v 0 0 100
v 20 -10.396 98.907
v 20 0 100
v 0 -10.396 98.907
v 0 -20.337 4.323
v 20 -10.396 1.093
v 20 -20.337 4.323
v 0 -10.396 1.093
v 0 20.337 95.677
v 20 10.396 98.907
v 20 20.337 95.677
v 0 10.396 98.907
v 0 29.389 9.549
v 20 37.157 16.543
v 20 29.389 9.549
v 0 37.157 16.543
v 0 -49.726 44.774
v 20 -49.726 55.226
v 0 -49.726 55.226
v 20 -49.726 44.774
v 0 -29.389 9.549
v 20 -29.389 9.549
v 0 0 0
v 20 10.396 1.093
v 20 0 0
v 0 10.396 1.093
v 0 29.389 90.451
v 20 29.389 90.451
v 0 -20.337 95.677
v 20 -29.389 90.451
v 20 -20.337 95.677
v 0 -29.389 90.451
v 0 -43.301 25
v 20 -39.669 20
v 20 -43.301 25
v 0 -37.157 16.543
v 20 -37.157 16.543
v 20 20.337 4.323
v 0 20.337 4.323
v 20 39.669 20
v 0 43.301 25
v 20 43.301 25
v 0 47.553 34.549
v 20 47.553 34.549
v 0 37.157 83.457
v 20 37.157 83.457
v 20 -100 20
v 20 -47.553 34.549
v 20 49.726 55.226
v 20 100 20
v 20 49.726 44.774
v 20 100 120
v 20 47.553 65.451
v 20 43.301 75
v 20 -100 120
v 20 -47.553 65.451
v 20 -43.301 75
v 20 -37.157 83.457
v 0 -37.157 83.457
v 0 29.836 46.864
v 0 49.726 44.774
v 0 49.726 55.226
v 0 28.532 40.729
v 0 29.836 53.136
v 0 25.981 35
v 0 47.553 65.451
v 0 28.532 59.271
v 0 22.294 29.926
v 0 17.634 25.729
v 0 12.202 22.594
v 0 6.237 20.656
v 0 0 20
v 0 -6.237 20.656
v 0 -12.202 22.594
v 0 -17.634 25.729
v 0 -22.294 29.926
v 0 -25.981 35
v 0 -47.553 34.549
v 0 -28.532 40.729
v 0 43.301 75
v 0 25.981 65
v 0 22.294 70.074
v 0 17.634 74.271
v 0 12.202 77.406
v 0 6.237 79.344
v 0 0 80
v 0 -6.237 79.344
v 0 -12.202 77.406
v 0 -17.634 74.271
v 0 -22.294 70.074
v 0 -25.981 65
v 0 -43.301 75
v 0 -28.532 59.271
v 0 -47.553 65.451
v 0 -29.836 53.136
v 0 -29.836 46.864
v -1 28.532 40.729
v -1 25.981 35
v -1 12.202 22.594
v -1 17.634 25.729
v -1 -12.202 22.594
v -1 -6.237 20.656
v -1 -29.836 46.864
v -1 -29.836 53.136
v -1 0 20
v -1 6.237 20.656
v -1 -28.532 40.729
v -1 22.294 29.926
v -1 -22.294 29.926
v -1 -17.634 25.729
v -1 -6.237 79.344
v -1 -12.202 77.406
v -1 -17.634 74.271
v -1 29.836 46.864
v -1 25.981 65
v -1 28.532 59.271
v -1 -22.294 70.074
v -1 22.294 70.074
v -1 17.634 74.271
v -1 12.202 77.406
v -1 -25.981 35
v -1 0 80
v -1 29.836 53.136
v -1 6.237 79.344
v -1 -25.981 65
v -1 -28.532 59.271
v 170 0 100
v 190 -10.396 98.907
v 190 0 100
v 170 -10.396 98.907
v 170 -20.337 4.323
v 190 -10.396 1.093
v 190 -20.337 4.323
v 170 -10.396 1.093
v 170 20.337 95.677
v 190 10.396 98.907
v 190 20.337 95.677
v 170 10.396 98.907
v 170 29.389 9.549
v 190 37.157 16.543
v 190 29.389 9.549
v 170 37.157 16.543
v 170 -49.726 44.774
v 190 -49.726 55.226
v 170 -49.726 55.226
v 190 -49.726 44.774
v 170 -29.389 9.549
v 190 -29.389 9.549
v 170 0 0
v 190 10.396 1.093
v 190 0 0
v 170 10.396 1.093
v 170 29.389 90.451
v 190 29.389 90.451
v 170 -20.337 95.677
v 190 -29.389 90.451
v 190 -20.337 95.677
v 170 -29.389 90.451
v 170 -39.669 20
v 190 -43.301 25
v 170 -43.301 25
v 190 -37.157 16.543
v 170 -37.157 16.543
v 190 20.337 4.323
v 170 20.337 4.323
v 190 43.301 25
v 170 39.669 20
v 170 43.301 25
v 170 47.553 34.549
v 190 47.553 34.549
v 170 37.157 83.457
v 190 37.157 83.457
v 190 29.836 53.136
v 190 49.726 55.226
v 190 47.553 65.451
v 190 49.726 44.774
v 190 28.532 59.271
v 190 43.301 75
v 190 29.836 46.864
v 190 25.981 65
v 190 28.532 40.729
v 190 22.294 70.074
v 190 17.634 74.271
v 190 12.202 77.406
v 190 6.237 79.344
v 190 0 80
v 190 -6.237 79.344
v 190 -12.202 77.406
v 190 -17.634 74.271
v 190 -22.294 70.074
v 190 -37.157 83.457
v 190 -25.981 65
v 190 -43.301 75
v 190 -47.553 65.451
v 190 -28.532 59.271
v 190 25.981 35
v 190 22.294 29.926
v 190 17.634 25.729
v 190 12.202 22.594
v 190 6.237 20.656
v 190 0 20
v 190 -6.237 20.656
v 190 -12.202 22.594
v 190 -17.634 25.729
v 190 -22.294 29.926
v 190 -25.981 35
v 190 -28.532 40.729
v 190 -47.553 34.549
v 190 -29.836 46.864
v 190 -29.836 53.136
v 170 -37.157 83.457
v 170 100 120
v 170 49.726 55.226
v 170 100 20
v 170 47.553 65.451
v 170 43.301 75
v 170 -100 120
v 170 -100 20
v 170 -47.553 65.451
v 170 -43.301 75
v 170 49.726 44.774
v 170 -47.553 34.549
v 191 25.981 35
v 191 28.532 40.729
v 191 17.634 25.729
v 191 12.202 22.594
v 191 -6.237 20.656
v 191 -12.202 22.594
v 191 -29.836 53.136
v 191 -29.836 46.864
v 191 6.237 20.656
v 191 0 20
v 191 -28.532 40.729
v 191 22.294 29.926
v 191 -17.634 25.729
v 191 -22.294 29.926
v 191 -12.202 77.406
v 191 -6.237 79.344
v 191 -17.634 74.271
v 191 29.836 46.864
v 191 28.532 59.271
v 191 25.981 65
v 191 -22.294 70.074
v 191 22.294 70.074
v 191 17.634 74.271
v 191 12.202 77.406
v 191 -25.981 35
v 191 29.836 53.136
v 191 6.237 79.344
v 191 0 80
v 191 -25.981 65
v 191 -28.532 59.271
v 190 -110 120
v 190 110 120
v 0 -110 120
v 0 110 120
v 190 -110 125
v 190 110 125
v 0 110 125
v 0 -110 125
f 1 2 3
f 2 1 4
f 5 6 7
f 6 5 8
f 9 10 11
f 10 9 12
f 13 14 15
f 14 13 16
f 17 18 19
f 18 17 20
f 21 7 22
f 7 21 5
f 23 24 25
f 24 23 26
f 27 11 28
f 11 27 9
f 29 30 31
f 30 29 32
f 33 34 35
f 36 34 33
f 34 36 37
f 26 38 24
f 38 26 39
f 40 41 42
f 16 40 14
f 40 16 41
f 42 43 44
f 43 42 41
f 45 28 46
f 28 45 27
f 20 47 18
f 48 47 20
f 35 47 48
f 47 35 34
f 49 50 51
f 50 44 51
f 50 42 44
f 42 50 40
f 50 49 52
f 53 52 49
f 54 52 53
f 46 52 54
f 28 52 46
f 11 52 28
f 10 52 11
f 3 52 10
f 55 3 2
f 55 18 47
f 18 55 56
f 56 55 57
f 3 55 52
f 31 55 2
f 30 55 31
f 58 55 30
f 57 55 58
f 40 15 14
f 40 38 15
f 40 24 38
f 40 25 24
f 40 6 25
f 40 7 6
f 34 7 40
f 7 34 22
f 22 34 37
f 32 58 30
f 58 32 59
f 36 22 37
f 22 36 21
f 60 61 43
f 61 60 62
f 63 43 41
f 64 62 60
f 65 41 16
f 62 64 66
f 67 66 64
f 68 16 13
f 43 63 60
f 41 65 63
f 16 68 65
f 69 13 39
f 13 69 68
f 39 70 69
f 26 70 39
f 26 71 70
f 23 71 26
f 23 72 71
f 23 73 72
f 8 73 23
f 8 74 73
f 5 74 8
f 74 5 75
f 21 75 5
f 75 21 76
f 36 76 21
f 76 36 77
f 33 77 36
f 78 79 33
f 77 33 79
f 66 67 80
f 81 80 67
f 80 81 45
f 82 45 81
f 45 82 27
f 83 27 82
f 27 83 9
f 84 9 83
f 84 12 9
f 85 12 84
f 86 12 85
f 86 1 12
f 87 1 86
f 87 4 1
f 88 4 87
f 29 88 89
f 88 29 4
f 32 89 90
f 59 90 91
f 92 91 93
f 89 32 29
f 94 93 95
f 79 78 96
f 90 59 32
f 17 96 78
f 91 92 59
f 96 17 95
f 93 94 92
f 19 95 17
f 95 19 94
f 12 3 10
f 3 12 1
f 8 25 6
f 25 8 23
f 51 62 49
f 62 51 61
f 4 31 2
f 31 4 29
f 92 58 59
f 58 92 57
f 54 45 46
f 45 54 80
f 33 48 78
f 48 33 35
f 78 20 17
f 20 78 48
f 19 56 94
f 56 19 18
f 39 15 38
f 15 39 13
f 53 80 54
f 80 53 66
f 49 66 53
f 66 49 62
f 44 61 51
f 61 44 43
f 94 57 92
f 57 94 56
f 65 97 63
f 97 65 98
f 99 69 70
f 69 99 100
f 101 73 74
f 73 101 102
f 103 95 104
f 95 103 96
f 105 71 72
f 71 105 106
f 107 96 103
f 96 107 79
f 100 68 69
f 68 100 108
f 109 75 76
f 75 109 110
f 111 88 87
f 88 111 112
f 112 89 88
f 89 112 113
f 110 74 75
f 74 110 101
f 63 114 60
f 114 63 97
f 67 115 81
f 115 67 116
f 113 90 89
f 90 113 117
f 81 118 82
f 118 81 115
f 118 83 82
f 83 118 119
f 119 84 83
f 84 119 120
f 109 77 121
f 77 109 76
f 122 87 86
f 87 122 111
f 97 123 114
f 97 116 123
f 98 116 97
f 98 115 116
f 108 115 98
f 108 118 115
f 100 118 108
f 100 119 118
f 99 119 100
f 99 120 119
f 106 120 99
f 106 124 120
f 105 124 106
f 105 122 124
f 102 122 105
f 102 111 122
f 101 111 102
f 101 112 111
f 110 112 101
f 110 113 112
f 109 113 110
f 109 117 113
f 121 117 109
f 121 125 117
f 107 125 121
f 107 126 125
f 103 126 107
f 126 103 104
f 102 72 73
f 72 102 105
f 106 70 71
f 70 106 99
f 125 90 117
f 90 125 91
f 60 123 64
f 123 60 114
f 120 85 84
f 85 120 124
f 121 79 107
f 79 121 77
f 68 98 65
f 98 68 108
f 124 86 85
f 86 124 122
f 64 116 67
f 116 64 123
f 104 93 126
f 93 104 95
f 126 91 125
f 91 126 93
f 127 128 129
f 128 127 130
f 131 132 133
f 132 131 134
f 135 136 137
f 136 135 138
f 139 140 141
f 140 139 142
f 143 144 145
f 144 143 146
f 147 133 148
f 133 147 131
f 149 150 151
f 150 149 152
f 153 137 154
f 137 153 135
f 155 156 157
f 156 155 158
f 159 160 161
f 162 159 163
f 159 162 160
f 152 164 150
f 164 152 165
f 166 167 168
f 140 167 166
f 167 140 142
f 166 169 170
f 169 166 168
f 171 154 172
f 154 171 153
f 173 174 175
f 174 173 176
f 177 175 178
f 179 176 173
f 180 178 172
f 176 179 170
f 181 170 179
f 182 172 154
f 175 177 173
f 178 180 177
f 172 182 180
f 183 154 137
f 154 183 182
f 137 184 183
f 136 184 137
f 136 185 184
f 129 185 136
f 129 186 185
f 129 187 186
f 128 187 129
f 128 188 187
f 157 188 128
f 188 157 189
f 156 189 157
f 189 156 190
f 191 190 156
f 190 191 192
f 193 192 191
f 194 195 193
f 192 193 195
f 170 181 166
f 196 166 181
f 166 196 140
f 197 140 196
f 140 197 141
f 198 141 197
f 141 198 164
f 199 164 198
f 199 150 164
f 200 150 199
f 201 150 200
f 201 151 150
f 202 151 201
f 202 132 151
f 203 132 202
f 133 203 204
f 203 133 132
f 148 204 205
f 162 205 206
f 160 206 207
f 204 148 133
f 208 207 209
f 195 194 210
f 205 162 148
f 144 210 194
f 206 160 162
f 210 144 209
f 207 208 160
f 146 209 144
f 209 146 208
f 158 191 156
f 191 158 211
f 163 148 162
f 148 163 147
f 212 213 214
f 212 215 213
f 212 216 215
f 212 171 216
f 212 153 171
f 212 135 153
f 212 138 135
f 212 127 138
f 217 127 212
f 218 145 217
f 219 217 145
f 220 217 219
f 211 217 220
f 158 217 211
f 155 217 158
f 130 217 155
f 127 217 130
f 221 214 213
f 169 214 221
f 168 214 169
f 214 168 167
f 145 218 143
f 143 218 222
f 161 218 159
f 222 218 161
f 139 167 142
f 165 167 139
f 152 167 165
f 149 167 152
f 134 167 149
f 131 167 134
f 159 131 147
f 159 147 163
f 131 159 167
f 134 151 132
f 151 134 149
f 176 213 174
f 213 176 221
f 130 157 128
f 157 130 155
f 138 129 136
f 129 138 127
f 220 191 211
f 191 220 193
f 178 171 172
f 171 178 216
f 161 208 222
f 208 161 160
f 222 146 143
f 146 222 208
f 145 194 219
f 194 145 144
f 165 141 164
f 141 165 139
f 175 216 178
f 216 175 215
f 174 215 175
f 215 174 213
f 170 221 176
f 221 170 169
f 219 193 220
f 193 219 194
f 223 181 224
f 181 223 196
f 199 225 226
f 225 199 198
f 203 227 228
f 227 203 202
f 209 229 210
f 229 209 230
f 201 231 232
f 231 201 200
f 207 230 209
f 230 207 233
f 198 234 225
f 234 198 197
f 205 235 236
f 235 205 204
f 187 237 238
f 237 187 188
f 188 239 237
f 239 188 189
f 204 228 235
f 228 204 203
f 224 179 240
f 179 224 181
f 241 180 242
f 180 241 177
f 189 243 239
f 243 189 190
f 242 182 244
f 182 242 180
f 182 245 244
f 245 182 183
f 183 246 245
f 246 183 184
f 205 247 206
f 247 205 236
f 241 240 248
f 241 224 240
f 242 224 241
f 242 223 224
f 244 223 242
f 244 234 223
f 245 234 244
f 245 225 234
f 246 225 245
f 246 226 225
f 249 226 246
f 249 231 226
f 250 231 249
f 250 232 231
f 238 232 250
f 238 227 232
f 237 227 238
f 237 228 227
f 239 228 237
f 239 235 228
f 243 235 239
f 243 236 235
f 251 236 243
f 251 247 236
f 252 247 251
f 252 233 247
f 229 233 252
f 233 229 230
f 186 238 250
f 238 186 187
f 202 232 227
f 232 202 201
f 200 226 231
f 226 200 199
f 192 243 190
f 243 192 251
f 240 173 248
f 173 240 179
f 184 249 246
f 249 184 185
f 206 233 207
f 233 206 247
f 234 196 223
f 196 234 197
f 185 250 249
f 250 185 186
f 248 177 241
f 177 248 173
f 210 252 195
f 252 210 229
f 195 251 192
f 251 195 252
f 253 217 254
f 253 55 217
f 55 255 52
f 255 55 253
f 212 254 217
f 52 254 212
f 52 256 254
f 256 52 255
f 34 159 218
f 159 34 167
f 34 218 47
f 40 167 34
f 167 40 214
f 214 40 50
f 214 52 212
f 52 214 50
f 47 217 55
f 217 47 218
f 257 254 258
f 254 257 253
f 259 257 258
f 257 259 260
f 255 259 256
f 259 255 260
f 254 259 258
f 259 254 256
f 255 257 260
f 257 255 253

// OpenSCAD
module pioneer_p3dx() {
    // Corpo
    color("red") translate([20,-100,20]) cube([150,200,100]);
    color("black") translate([0,-110,120]) cube([190,220,5]);

    // Rodas 
    module roda() {
        color("black") translate([0,0,50]) rotate([0,90,0]) cylinder(h=20,r=50);
        color("gold") translate([-1,0,50]) rotate([0,90,0]) cylinder(h=22,r=30);
    }

    roda();
    translate([170,0,0]) roda();
}

pioneer_p3dx();
